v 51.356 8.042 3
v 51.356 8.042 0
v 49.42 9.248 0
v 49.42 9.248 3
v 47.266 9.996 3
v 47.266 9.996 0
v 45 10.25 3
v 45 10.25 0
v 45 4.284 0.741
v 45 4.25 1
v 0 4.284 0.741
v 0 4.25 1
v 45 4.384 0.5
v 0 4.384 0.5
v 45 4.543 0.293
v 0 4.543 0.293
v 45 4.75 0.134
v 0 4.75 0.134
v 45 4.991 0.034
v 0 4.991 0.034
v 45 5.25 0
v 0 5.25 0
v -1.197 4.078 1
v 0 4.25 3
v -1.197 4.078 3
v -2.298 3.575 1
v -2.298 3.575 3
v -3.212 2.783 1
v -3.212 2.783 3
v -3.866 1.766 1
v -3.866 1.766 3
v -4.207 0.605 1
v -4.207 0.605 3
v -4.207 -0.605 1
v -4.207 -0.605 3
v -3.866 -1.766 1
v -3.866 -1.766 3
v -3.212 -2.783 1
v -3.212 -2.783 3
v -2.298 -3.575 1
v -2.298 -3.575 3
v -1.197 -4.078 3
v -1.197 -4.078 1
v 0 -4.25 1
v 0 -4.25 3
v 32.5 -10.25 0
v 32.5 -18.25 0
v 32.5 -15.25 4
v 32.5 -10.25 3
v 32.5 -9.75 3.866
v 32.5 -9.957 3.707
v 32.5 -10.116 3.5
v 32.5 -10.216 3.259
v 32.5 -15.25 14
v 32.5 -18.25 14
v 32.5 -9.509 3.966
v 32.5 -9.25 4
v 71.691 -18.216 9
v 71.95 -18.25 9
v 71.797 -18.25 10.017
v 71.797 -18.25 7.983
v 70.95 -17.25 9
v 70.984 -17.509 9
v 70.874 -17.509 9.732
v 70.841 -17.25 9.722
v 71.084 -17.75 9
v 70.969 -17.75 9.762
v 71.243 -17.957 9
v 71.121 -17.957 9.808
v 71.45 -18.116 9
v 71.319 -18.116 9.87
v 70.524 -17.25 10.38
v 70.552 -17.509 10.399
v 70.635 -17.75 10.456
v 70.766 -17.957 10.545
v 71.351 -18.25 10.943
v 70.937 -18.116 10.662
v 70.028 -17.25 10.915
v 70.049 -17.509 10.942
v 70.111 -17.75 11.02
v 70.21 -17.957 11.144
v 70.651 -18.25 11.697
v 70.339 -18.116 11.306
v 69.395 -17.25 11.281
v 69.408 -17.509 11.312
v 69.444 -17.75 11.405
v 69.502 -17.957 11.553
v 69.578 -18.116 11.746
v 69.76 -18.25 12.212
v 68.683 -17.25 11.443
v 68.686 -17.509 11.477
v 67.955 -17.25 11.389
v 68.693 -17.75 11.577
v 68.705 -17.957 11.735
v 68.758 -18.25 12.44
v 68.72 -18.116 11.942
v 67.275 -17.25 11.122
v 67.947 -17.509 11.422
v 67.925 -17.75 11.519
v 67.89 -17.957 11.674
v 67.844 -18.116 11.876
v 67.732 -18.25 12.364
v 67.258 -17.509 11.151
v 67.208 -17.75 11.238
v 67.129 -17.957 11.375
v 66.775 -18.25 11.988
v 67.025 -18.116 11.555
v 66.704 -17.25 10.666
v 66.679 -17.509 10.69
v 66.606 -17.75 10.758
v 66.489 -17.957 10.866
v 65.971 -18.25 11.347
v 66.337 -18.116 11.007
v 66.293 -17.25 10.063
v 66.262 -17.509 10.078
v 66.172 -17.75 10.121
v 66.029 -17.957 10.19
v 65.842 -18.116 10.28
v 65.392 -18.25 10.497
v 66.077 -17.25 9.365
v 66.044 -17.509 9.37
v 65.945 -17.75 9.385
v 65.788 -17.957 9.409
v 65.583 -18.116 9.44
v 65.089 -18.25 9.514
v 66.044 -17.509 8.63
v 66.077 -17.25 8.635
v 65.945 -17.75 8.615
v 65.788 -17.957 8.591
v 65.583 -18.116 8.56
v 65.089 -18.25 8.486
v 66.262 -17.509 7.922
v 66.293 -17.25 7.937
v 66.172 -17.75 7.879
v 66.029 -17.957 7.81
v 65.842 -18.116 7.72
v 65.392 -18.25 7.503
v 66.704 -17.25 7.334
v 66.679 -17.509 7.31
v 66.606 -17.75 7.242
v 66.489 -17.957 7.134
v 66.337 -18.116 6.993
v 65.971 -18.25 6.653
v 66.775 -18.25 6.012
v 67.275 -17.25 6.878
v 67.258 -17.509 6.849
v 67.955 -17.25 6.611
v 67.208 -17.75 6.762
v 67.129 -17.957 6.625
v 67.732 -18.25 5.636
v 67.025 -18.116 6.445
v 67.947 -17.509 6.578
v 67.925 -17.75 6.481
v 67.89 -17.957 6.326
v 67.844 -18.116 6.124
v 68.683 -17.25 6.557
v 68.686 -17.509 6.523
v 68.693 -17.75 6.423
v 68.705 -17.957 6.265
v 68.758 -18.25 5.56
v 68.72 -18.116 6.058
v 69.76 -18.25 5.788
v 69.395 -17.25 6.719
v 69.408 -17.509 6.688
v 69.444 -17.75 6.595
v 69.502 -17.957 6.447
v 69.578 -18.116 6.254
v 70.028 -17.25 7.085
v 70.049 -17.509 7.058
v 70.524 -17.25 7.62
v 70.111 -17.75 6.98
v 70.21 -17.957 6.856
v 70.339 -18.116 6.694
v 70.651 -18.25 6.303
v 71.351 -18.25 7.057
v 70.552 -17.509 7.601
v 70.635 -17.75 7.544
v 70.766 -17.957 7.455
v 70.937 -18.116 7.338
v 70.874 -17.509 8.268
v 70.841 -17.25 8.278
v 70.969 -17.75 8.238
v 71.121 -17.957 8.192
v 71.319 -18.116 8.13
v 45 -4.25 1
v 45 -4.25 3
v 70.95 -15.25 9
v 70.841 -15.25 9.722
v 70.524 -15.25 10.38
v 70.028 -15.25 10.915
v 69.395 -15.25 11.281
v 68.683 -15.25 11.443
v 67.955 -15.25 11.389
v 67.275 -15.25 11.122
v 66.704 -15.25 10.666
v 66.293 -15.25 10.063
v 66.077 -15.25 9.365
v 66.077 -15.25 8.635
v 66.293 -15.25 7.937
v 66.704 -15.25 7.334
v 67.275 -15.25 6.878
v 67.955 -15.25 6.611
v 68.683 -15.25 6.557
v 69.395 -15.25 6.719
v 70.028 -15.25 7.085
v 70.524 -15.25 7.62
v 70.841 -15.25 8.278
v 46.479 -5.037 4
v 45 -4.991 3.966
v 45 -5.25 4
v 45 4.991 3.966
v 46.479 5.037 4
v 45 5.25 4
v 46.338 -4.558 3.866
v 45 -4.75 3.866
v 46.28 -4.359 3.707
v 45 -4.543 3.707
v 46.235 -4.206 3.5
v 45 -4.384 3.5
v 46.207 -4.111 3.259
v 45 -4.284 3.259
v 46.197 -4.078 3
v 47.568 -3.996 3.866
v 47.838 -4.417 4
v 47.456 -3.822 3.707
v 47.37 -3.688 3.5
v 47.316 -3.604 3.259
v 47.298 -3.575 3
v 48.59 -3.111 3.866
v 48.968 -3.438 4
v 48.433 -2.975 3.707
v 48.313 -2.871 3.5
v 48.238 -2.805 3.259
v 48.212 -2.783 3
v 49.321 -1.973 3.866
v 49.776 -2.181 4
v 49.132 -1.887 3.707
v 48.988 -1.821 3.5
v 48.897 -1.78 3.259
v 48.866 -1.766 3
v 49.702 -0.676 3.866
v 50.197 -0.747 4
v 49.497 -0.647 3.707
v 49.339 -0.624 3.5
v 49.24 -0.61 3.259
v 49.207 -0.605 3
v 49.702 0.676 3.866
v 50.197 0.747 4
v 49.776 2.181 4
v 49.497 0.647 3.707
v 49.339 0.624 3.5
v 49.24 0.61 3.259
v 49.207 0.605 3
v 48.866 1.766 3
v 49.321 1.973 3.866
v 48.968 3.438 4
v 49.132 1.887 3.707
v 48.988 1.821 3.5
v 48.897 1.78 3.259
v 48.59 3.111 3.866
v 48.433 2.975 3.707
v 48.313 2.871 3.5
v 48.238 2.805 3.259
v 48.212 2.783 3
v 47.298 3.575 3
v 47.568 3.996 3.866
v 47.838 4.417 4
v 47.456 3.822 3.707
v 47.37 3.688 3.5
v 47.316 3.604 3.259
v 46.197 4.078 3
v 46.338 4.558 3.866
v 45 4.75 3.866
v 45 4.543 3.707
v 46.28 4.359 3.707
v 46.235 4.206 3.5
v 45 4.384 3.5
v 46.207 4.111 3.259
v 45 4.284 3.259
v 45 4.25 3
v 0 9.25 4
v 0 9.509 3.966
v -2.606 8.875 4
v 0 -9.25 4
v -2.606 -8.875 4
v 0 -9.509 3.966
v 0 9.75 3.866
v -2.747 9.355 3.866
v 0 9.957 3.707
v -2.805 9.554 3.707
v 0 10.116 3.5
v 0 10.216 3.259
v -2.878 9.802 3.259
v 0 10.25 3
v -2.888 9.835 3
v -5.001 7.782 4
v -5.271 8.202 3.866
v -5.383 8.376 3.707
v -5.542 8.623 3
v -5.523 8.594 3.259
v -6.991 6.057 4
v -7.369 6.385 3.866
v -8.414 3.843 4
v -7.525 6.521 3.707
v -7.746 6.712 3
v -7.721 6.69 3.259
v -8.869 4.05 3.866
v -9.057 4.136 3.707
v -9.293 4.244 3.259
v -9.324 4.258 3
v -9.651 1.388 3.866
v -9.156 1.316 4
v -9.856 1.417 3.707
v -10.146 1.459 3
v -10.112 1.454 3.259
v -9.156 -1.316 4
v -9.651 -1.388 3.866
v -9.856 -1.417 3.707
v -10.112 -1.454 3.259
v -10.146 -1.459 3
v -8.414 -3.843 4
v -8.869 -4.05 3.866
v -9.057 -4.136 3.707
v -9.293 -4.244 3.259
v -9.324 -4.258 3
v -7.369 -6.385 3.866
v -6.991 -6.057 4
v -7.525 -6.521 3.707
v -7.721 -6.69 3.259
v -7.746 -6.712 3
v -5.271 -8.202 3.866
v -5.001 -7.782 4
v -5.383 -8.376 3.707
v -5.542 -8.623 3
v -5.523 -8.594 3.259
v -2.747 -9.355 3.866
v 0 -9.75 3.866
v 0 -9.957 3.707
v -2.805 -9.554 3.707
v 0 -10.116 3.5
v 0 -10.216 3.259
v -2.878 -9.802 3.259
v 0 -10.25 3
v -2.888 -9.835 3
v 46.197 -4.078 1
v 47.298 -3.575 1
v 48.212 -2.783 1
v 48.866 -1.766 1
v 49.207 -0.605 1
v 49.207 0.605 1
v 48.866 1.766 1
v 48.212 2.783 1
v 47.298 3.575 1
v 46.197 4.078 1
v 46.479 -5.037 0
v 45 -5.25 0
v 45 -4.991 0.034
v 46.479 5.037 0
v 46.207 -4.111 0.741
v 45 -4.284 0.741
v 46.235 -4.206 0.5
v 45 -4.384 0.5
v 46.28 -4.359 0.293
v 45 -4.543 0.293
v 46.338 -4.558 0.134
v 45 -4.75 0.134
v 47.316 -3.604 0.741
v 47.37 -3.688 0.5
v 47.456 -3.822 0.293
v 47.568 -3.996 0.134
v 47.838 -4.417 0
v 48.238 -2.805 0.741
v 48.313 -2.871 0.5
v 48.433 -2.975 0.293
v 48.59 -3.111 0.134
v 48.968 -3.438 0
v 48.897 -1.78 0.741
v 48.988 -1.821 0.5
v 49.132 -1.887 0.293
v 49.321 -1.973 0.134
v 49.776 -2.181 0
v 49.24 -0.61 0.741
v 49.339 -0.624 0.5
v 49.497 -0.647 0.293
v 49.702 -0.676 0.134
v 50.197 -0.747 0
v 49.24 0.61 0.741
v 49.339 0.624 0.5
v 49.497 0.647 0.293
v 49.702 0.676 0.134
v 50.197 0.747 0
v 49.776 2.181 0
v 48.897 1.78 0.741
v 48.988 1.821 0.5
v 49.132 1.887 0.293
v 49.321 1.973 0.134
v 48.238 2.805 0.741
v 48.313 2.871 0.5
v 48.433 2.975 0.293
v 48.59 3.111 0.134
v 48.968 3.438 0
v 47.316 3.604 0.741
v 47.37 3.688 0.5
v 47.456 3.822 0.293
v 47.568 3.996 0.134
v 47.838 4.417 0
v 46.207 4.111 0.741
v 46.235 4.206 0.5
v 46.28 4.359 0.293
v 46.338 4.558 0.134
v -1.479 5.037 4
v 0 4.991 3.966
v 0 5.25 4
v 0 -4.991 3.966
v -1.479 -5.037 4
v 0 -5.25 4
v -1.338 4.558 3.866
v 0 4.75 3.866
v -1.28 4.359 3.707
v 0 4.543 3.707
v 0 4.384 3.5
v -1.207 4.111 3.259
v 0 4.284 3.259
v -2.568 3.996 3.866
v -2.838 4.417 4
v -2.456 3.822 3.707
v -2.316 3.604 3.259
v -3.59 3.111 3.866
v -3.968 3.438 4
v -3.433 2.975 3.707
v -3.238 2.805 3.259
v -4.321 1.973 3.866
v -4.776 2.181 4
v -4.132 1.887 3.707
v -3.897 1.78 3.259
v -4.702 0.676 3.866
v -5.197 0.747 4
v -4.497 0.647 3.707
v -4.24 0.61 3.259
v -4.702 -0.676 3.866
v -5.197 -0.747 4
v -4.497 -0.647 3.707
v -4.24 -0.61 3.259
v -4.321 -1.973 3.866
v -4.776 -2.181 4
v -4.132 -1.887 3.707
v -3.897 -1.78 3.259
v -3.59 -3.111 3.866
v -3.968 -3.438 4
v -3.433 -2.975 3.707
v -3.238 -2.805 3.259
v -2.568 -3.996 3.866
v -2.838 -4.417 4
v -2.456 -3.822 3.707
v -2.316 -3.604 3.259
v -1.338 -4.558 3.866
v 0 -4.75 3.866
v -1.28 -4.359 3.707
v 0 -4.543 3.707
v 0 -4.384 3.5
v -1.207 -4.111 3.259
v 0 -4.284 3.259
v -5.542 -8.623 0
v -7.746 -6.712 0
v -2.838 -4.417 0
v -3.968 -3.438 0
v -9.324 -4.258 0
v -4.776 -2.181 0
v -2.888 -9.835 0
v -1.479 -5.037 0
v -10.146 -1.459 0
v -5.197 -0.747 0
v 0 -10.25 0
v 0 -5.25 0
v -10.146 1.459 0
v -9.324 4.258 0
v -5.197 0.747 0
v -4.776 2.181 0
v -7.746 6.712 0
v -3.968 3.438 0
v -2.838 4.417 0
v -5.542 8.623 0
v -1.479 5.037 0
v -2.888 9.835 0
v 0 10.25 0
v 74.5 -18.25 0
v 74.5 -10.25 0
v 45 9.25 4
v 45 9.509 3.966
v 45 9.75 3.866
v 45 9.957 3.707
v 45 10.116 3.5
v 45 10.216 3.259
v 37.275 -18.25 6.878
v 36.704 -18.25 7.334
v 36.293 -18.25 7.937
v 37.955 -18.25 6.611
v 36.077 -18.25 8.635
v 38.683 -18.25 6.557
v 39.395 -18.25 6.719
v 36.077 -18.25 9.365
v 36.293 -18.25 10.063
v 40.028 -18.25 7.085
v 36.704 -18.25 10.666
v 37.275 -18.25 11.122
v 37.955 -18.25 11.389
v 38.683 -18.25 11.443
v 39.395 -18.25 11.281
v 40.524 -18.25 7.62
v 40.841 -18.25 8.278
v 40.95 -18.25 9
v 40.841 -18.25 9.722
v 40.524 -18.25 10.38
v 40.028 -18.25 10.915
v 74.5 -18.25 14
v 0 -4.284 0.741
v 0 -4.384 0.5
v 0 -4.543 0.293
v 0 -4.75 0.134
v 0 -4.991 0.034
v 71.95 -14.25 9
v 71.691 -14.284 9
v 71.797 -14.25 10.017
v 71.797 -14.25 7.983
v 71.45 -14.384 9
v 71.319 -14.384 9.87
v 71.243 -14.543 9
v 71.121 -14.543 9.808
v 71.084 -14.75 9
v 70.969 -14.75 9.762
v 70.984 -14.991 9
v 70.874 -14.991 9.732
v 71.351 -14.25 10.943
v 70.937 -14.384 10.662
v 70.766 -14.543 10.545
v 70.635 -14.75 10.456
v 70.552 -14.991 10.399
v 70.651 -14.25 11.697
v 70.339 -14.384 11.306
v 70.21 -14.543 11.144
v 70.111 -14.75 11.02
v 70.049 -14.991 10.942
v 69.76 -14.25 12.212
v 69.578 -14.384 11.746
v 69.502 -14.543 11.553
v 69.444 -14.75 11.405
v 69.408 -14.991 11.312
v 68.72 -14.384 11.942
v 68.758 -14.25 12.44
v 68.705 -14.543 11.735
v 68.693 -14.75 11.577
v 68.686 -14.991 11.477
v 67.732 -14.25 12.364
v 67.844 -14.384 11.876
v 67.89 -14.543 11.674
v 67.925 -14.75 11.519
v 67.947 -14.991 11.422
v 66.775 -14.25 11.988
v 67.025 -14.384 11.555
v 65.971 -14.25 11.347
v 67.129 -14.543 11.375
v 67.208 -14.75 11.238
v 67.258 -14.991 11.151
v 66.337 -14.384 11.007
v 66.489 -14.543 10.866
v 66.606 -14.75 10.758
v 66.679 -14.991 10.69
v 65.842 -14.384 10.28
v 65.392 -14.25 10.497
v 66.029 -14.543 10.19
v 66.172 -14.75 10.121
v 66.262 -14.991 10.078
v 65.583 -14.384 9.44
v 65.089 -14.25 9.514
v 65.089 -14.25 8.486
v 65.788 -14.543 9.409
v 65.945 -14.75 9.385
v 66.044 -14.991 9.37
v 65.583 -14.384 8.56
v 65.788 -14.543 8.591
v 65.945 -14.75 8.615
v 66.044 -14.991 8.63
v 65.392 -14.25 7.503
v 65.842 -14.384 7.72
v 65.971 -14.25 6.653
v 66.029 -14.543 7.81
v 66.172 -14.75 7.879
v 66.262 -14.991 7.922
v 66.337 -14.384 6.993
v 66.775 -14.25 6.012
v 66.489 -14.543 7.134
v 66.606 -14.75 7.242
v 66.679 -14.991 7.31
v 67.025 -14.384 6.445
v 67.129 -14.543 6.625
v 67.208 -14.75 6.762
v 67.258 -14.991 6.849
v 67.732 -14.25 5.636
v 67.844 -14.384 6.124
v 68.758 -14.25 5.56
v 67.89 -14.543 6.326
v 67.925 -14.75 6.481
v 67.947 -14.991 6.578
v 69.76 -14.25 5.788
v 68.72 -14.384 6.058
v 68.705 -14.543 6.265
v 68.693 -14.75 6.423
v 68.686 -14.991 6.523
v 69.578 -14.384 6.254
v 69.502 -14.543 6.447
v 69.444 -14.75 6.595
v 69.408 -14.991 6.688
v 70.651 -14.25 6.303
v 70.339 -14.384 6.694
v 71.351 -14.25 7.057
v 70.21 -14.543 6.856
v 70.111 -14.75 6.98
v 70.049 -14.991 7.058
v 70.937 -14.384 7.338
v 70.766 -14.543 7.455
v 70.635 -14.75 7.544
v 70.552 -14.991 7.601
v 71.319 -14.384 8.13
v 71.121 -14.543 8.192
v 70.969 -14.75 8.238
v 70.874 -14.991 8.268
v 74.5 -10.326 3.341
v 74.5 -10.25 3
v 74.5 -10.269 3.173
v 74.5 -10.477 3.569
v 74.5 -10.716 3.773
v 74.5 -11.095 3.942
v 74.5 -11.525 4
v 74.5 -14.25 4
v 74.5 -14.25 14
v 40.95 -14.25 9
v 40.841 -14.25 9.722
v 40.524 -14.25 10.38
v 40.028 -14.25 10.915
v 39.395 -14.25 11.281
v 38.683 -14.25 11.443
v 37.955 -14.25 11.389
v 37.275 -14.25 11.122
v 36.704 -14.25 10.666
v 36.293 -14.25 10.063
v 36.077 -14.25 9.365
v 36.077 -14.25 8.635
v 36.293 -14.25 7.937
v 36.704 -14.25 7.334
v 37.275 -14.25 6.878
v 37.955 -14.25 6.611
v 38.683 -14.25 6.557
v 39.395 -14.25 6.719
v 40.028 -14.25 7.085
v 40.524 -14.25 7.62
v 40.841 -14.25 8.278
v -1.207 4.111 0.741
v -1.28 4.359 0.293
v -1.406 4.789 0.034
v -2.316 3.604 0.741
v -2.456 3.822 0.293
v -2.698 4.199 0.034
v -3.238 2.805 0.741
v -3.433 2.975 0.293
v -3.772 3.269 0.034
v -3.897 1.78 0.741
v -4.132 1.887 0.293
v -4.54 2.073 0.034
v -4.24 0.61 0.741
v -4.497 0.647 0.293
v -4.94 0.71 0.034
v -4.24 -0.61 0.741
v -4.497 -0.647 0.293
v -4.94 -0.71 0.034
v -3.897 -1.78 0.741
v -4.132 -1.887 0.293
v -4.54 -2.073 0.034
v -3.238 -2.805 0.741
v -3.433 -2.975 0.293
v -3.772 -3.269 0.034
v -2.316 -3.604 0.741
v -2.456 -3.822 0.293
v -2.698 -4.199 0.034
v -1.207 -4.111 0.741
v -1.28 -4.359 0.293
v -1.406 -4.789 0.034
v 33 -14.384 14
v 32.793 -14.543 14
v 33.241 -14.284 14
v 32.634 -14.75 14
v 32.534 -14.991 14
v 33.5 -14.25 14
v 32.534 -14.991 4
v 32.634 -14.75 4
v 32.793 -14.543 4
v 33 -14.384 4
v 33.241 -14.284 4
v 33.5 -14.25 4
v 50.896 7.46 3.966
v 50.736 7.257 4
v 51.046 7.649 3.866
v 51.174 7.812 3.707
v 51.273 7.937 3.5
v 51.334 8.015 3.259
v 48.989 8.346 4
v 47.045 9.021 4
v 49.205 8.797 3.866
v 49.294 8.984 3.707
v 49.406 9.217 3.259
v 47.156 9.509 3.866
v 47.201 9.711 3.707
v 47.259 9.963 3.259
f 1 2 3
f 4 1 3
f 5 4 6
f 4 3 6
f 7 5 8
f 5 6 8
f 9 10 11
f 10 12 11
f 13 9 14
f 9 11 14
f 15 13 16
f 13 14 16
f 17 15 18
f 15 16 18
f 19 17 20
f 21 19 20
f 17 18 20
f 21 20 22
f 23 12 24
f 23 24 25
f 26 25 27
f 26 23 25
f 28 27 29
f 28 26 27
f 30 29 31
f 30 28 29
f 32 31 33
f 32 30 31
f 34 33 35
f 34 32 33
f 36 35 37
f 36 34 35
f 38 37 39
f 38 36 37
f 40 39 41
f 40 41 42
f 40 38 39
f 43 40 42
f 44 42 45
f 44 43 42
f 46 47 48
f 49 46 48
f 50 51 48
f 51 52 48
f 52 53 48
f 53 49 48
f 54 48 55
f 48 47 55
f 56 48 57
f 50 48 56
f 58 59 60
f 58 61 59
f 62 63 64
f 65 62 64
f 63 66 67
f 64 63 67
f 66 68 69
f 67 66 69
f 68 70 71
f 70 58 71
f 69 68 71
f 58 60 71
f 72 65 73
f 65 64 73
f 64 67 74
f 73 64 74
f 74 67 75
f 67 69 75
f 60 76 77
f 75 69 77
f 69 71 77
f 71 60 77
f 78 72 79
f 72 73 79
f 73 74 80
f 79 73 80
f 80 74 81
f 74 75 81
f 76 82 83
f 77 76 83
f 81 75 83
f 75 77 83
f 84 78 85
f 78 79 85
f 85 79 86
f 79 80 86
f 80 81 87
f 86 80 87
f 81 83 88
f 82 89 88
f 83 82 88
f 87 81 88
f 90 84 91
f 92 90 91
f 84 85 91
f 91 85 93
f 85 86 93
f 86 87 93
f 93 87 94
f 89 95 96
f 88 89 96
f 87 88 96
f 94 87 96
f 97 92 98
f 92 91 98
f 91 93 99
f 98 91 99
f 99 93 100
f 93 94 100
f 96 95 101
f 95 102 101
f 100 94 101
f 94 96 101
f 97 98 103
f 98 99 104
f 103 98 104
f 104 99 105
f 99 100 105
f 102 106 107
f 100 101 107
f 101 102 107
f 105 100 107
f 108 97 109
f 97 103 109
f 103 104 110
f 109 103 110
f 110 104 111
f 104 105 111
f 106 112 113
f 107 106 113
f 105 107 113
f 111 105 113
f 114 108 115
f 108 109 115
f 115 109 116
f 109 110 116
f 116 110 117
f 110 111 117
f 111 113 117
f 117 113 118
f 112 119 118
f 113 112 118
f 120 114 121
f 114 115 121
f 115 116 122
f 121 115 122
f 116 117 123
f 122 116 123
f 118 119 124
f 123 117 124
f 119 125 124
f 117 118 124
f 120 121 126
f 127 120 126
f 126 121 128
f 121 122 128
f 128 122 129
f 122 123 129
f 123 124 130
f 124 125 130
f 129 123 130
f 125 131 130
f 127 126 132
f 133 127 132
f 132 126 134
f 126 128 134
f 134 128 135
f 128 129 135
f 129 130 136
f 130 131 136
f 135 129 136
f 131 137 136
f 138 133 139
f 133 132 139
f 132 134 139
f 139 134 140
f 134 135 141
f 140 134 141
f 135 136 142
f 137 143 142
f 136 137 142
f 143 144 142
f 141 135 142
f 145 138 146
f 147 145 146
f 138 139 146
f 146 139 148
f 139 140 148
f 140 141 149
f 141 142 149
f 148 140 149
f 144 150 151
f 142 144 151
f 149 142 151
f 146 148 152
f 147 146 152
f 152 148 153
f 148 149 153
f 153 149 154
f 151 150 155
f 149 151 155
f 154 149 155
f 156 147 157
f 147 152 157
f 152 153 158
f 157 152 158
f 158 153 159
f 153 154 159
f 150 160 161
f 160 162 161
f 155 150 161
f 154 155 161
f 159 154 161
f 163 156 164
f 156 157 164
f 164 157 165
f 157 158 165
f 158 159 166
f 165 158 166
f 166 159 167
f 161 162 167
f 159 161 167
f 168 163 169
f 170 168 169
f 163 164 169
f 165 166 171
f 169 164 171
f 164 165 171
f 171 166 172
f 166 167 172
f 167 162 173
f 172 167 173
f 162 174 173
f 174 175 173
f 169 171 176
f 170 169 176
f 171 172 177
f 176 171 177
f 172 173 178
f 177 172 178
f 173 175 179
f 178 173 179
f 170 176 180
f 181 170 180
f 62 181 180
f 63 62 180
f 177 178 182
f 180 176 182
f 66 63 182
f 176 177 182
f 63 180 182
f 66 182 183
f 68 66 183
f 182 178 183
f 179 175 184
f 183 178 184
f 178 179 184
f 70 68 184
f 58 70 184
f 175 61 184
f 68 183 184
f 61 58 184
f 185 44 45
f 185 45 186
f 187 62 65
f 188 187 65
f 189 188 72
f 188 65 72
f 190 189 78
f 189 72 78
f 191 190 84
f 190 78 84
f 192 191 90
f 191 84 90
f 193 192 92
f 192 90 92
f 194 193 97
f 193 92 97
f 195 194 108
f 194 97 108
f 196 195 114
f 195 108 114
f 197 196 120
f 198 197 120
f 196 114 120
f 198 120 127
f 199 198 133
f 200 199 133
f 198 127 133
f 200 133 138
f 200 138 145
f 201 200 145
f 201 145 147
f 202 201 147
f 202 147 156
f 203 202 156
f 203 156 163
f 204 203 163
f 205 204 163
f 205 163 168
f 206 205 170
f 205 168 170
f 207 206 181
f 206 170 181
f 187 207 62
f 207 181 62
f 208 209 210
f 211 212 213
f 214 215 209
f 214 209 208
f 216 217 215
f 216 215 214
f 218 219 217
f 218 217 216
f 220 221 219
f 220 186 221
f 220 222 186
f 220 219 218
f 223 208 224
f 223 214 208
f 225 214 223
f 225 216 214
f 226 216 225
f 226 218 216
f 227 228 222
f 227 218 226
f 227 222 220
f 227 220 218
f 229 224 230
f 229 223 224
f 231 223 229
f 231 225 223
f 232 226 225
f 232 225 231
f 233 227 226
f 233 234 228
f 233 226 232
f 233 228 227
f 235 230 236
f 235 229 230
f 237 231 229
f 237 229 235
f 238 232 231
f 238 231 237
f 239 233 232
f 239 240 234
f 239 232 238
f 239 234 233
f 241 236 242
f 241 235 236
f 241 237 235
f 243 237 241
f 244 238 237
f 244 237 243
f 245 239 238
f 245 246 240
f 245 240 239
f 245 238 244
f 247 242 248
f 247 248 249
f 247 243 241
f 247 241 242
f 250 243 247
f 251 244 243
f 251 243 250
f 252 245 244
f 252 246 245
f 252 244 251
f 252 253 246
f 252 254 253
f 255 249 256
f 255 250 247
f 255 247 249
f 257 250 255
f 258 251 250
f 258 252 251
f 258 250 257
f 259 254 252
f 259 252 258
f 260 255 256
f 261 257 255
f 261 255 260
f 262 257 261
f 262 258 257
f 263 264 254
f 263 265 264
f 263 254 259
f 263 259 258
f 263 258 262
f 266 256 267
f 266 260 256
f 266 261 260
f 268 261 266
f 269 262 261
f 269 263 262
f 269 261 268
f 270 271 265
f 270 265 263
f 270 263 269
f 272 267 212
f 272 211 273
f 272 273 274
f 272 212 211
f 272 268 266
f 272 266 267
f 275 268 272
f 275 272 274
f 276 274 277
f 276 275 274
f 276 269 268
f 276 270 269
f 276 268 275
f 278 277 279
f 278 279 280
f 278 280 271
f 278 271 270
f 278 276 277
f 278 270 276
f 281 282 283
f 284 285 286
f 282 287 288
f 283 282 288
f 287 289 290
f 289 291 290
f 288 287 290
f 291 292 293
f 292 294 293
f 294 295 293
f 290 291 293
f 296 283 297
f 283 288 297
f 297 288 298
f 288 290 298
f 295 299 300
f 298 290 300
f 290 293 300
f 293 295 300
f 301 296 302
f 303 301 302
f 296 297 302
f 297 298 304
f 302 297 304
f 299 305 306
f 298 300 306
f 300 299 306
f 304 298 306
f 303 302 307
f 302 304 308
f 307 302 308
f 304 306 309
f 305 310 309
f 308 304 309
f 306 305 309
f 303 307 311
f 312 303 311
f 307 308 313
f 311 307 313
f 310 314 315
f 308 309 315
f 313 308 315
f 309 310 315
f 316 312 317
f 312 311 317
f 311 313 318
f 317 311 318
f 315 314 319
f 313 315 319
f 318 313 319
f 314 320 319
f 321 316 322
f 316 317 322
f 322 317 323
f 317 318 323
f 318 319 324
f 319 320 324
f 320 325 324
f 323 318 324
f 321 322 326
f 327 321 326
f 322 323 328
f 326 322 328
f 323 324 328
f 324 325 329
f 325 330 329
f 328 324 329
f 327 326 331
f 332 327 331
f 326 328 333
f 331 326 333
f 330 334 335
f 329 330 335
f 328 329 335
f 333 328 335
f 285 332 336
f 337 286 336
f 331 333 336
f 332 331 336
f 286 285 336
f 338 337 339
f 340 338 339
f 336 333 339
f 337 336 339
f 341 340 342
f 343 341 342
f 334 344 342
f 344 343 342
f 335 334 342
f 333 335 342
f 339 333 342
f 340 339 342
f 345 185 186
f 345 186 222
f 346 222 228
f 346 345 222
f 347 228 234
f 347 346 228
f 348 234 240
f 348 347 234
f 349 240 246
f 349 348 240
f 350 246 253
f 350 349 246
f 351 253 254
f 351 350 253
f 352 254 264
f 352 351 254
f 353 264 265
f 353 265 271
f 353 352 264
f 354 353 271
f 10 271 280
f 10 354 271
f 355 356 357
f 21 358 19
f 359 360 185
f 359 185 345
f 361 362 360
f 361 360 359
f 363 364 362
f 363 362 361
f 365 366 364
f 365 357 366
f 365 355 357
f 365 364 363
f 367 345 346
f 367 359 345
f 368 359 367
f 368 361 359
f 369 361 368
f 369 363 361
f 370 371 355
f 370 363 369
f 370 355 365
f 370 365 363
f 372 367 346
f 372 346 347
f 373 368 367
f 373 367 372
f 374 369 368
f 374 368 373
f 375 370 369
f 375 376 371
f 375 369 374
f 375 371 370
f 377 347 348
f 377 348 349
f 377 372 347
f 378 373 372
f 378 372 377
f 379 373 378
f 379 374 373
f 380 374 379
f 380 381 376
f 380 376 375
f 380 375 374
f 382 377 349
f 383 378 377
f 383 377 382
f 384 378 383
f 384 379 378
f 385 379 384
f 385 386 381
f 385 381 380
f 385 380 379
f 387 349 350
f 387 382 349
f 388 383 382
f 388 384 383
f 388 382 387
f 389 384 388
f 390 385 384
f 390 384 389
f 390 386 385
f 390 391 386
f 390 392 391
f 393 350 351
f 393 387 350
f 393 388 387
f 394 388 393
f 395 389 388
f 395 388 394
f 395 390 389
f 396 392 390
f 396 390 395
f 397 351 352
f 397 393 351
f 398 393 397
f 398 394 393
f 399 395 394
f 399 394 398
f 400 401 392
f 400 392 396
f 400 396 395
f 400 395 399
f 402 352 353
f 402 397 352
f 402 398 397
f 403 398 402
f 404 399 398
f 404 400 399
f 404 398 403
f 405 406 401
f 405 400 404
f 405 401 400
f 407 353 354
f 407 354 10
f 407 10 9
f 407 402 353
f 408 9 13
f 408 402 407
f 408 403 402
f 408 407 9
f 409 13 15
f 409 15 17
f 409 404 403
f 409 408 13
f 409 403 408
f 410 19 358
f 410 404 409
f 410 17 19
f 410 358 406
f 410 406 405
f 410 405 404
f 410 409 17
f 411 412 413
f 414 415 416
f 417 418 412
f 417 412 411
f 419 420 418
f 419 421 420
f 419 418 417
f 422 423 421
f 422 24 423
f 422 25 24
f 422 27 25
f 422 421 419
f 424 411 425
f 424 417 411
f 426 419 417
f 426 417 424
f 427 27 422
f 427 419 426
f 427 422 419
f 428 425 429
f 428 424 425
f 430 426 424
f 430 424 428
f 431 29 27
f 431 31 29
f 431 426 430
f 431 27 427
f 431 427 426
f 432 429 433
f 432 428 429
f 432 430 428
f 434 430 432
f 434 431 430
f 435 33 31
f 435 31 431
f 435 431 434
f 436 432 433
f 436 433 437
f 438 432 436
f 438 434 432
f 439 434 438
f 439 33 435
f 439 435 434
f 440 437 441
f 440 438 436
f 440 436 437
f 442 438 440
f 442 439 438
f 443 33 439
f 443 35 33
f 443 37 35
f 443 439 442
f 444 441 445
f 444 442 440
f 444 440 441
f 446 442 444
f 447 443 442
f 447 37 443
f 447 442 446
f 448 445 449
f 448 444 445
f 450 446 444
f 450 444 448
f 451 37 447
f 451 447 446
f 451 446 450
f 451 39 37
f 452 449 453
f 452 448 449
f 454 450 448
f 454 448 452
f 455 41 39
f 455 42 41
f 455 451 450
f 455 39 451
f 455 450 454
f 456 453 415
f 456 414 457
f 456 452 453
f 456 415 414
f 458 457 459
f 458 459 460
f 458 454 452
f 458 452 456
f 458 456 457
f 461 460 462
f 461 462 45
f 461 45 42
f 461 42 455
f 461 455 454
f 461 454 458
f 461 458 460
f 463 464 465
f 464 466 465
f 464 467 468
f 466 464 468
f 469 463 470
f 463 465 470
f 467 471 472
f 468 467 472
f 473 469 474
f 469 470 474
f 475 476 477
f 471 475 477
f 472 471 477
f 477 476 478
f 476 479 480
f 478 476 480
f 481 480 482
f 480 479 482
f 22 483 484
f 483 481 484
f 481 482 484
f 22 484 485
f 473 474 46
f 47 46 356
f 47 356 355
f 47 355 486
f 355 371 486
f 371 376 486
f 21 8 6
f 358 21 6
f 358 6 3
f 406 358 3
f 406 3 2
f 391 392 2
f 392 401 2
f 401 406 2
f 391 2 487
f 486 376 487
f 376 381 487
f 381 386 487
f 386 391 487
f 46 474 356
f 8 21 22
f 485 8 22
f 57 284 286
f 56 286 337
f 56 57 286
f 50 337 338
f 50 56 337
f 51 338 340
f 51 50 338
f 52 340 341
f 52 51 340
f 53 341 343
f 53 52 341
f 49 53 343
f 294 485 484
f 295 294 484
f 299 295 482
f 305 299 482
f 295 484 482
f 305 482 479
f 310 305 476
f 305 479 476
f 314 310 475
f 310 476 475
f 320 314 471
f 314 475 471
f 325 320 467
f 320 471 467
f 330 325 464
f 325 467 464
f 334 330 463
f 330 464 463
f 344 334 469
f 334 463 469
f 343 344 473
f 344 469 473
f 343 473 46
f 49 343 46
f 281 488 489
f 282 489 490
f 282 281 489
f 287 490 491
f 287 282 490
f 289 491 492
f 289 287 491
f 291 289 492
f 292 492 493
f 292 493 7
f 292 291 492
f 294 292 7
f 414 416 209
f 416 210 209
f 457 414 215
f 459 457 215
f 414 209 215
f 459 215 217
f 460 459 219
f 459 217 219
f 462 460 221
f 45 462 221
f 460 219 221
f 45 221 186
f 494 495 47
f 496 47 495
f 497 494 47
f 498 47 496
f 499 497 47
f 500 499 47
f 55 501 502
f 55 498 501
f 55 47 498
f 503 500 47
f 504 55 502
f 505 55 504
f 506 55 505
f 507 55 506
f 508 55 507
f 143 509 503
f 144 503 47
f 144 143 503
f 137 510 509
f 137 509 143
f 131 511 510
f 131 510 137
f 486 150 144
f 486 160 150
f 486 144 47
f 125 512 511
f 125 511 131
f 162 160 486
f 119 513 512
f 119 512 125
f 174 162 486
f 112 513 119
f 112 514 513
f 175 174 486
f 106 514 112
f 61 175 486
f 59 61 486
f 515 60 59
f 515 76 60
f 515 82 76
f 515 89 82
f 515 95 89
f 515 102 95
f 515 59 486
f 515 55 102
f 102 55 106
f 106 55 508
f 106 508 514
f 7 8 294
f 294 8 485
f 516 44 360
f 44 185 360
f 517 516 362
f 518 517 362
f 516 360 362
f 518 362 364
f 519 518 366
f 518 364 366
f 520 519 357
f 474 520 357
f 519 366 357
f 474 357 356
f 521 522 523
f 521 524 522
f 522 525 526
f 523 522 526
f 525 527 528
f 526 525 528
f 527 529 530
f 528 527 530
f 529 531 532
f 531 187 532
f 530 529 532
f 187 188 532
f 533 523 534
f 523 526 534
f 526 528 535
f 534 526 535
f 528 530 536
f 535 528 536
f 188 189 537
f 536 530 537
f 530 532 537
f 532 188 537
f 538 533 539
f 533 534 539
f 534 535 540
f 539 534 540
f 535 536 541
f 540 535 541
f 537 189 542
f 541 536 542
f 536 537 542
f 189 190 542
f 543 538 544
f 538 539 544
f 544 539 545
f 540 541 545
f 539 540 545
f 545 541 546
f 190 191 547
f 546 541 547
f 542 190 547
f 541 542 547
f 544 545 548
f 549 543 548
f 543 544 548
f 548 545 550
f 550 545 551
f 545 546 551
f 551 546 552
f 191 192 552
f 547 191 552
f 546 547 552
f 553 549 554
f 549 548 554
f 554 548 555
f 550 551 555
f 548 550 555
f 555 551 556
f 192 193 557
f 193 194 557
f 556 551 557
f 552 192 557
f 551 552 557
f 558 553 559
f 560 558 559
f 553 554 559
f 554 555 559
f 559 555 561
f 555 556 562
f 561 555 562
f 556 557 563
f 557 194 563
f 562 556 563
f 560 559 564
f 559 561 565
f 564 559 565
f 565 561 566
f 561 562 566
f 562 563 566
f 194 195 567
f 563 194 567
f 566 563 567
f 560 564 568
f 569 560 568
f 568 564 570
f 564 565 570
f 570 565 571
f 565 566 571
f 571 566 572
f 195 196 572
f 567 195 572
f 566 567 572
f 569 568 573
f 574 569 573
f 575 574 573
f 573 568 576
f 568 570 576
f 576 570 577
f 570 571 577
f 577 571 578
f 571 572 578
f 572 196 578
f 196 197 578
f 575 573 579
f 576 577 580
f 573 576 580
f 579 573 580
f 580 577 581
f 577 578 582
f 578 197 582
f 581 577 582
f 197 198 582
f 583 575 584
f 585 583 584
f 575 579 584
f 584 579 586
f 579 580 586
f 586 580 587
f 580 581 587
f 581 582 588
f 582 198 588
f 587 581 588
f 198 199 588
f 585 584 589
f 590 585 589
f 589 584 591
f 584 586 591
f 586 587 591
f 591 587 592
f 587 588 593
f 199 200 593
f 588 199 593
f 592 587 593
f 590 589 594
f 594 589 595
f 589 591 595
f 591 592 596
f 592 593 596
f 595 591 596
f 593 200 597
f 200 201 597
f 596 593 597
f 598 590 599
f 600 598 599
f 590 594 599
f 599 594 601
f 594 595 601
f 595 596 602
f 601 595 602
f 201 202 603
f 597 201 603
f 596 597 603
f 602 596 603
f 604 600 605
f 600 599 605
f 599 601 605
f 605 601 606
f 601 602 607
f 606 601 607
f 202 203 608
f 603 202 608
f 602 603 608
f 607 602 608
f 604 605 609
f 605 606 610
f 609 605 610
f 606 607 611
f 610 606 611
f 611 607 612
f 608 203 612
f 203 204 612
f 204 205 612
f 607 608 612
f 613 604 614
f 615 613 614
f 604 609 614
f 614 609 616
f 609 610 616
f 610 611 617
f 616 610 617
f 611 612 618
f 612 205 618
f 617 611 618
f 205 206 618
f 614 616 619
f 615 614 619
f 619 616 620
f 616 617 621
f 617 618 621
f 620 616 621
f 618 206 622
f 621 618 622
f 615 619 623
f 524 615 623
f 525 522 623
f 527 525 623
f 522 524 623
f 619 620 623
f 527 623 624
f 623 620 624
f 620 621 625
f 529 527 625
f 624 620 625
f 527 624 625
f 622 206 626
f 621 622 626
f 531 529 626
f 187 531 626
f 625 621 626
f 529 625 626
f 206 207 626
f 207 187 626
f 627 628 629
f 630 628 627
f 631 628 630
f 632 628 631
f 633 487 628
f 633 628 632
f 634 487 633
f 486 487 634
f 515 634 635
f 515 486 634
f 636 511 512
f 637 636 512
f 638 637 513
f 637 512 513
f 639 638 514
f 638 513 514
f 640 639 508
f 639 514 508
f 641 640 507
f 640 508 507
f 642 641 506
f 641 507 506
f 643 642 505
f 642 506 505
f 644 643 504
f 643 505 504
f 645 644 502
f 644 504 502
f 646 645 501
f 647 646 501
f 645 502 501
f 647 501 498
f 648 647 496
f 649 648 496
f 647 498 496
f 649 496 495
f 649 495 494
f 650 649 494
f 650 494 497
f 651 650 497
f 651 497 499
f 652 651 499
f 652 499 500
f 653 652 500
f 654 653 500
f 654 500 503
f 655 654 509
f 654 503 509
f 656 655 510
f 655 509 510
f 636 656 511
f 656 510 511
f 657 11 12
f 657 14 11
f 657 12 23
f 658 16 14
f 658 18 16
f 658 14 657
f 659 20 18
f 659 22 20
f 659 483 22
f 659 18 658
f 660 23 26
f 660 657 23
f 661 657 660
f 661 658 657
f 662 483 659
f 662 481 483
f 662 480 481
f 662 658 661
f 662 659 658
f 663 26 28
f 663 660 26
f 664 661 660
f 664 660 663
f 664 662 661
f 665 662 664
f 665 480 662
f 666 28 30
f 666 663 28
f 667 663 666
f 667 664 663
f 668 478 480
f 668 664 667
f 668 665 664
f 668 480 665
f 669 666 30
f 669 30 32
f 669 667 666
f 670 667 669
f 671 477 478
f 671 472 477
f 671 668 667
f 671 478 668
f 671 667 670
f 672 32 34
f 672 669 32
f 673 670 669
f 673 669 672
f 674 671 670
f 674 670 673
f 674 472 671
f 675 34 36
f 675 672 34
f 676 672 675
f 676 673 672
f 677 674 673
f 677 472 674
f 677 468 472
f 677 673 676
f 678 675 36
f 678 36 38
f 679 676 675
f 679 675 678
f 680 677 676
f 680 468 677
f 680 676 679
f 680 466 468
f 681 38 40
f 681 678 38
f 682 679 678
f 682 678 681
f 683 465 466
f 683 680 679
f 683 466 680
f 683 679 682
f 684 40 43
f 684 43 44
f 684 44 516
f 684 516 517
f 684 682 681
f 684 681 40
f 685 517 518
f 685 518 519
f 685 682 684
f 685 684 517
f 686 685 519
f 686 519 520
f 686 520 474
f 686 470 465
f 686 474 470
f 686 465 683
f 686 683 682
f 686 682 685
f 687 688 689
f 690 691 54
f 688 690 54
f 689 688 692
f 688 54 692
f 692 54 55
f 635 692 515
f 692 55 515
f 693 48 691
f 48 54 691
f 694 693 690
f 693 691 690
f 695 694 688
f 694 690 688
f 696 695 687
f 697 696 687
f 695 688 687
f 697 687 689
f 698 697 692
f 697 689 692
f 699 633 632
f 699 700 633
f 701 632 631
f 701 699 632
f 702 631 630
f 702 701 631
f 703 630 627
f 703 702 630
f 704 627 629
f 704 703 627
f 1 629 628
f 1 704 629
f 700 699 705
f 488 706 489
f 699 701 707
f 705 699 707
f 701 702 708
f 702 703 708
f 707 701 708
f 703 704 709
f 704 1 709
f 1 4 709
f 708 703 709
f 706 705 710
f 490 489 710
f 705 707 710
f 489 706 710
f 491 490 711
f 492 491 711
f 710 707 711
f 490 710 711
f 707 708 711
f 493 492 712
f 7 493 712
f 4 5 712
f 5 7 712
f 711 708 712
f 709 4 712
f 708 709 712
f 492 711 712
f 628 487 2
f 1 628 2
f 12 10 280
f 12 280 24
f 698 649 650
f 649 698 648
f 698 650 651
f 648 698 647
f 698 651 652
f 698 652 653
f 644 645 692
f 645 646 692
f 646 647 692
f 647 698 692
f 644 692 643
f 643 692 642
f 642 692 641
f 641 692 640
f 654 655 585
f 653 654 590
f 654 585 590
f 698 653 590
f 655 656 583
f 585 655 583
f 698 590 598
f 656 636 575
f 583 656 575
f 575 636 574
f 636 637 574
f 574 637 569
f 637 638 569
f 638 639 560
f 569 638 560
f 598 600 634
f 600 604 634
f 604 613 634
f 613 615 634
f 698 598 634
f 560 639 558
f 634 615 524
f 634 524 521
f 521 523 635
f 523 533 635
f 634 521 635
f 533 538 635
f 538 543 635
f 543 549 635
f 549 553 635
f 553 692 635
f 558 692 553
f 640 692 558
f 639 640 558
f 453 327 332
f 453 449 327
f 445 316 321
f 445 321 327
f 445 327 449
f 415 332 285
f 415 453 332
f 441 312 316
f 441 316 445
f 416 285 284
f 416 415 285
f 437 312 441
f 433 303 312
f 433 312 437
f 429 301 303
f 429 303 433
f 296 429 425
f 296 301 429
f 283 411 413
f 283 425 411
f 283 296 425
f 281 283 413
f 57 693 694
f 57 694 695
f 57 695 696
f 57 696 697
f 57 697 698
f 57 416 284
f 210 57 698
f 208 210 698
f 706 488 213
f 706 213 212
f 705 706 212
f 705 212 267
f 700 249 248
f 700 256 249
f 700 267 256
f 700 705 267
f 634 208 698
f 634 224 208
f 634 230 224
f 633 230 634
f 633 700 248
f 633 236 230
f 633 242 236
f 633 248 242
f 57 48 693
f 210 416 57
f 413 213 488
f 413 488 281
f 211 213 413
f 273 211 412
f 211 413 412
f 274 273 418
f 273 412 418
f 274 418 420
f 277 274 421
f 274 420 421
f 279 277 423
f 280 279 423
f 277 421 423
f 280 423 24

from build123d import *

# Parameters (mm, degrees)
PAD011_DEPTH = 4
SKETCH013_W  = 42
SKETCH013_H  = 10
SKETCH013_R  = 2.45
PAD012_DEPTH = 4
FILLET005_R  = 1


with BuildPart() as part:
    # Sketch012 → Pad011 (new body)
    with BuildSketch(Plane.XY):
        with BuildLine():
            ThreePointArc((0, 10.25), (-10.25, 0), (0, -10.25))
            Line((0, -10.25), (32.5, -10.25))
            Line((32.5, -18.25), (32.5, -10.25))
            Line((32.5, -18.25), (74.5, -18.25))
            Line((74.5, -10.25), (74.5, -18.25))
            Line((74.5, -10.25), (51.355591, 8.041701))
            ThreePointArc((51.355591, 8.041701), (48.364154, 9.682199), (45, 10.25))
            Line((45, 10.25), (0, 10.25))
        make_face()
        with BuildLine():
            ThreePointArc((0, 4.25), (-4.25, 0), (0, -4.25))
            Line((0, -4.25), (45, -4.25))
            ThreePointArc((45, -4.25), (49.25, 0), (45, 4.25))
            Line((45, 4.25), (0, 4.25))
        make_face(mode=Mode.SUBTRACT)
    extrude(amount=PAD011_DEPTH)

    # Sketch013 → Pad012 (join)
    with BuildSketch(Plane(origin=(32.5, -18.25, 4), x_dir=(1, 0, 0), z_dir=(0, -1, 0))):
        with Locations((21, 5)):
            Rectangle(SKETCH013_W, SKETCH013_H)
        with Locations((6, 5)):
            Circle(SKETCH013_R, mode=Mode.SUBTRACT)
        with Locations((36, 5)):
            Circle(SKETCH013_R, mode=Mode.SUBTRACT)
    extrude(amount=-PAD012_DEPTH)

    # Fillet005
    fillet005_edges = [part.edges().sort_by_distance(p)[0] for p in [
        (0, -4.25, 2),
        (45, -4.25, 2),
        (22.5, -4.25, 0),
        (22.5, -4.25, 4),
        (70.95, -16.25, 9),
        (66.05, -18.25, 9),
        (66.05, -14.25, 9),
        (32.5, -14.25, 9),
        (16.25, -10.25, 4),
    ]]
    fillet(fillet005_edges, radius=FILLET005_R)


solid = part.part
